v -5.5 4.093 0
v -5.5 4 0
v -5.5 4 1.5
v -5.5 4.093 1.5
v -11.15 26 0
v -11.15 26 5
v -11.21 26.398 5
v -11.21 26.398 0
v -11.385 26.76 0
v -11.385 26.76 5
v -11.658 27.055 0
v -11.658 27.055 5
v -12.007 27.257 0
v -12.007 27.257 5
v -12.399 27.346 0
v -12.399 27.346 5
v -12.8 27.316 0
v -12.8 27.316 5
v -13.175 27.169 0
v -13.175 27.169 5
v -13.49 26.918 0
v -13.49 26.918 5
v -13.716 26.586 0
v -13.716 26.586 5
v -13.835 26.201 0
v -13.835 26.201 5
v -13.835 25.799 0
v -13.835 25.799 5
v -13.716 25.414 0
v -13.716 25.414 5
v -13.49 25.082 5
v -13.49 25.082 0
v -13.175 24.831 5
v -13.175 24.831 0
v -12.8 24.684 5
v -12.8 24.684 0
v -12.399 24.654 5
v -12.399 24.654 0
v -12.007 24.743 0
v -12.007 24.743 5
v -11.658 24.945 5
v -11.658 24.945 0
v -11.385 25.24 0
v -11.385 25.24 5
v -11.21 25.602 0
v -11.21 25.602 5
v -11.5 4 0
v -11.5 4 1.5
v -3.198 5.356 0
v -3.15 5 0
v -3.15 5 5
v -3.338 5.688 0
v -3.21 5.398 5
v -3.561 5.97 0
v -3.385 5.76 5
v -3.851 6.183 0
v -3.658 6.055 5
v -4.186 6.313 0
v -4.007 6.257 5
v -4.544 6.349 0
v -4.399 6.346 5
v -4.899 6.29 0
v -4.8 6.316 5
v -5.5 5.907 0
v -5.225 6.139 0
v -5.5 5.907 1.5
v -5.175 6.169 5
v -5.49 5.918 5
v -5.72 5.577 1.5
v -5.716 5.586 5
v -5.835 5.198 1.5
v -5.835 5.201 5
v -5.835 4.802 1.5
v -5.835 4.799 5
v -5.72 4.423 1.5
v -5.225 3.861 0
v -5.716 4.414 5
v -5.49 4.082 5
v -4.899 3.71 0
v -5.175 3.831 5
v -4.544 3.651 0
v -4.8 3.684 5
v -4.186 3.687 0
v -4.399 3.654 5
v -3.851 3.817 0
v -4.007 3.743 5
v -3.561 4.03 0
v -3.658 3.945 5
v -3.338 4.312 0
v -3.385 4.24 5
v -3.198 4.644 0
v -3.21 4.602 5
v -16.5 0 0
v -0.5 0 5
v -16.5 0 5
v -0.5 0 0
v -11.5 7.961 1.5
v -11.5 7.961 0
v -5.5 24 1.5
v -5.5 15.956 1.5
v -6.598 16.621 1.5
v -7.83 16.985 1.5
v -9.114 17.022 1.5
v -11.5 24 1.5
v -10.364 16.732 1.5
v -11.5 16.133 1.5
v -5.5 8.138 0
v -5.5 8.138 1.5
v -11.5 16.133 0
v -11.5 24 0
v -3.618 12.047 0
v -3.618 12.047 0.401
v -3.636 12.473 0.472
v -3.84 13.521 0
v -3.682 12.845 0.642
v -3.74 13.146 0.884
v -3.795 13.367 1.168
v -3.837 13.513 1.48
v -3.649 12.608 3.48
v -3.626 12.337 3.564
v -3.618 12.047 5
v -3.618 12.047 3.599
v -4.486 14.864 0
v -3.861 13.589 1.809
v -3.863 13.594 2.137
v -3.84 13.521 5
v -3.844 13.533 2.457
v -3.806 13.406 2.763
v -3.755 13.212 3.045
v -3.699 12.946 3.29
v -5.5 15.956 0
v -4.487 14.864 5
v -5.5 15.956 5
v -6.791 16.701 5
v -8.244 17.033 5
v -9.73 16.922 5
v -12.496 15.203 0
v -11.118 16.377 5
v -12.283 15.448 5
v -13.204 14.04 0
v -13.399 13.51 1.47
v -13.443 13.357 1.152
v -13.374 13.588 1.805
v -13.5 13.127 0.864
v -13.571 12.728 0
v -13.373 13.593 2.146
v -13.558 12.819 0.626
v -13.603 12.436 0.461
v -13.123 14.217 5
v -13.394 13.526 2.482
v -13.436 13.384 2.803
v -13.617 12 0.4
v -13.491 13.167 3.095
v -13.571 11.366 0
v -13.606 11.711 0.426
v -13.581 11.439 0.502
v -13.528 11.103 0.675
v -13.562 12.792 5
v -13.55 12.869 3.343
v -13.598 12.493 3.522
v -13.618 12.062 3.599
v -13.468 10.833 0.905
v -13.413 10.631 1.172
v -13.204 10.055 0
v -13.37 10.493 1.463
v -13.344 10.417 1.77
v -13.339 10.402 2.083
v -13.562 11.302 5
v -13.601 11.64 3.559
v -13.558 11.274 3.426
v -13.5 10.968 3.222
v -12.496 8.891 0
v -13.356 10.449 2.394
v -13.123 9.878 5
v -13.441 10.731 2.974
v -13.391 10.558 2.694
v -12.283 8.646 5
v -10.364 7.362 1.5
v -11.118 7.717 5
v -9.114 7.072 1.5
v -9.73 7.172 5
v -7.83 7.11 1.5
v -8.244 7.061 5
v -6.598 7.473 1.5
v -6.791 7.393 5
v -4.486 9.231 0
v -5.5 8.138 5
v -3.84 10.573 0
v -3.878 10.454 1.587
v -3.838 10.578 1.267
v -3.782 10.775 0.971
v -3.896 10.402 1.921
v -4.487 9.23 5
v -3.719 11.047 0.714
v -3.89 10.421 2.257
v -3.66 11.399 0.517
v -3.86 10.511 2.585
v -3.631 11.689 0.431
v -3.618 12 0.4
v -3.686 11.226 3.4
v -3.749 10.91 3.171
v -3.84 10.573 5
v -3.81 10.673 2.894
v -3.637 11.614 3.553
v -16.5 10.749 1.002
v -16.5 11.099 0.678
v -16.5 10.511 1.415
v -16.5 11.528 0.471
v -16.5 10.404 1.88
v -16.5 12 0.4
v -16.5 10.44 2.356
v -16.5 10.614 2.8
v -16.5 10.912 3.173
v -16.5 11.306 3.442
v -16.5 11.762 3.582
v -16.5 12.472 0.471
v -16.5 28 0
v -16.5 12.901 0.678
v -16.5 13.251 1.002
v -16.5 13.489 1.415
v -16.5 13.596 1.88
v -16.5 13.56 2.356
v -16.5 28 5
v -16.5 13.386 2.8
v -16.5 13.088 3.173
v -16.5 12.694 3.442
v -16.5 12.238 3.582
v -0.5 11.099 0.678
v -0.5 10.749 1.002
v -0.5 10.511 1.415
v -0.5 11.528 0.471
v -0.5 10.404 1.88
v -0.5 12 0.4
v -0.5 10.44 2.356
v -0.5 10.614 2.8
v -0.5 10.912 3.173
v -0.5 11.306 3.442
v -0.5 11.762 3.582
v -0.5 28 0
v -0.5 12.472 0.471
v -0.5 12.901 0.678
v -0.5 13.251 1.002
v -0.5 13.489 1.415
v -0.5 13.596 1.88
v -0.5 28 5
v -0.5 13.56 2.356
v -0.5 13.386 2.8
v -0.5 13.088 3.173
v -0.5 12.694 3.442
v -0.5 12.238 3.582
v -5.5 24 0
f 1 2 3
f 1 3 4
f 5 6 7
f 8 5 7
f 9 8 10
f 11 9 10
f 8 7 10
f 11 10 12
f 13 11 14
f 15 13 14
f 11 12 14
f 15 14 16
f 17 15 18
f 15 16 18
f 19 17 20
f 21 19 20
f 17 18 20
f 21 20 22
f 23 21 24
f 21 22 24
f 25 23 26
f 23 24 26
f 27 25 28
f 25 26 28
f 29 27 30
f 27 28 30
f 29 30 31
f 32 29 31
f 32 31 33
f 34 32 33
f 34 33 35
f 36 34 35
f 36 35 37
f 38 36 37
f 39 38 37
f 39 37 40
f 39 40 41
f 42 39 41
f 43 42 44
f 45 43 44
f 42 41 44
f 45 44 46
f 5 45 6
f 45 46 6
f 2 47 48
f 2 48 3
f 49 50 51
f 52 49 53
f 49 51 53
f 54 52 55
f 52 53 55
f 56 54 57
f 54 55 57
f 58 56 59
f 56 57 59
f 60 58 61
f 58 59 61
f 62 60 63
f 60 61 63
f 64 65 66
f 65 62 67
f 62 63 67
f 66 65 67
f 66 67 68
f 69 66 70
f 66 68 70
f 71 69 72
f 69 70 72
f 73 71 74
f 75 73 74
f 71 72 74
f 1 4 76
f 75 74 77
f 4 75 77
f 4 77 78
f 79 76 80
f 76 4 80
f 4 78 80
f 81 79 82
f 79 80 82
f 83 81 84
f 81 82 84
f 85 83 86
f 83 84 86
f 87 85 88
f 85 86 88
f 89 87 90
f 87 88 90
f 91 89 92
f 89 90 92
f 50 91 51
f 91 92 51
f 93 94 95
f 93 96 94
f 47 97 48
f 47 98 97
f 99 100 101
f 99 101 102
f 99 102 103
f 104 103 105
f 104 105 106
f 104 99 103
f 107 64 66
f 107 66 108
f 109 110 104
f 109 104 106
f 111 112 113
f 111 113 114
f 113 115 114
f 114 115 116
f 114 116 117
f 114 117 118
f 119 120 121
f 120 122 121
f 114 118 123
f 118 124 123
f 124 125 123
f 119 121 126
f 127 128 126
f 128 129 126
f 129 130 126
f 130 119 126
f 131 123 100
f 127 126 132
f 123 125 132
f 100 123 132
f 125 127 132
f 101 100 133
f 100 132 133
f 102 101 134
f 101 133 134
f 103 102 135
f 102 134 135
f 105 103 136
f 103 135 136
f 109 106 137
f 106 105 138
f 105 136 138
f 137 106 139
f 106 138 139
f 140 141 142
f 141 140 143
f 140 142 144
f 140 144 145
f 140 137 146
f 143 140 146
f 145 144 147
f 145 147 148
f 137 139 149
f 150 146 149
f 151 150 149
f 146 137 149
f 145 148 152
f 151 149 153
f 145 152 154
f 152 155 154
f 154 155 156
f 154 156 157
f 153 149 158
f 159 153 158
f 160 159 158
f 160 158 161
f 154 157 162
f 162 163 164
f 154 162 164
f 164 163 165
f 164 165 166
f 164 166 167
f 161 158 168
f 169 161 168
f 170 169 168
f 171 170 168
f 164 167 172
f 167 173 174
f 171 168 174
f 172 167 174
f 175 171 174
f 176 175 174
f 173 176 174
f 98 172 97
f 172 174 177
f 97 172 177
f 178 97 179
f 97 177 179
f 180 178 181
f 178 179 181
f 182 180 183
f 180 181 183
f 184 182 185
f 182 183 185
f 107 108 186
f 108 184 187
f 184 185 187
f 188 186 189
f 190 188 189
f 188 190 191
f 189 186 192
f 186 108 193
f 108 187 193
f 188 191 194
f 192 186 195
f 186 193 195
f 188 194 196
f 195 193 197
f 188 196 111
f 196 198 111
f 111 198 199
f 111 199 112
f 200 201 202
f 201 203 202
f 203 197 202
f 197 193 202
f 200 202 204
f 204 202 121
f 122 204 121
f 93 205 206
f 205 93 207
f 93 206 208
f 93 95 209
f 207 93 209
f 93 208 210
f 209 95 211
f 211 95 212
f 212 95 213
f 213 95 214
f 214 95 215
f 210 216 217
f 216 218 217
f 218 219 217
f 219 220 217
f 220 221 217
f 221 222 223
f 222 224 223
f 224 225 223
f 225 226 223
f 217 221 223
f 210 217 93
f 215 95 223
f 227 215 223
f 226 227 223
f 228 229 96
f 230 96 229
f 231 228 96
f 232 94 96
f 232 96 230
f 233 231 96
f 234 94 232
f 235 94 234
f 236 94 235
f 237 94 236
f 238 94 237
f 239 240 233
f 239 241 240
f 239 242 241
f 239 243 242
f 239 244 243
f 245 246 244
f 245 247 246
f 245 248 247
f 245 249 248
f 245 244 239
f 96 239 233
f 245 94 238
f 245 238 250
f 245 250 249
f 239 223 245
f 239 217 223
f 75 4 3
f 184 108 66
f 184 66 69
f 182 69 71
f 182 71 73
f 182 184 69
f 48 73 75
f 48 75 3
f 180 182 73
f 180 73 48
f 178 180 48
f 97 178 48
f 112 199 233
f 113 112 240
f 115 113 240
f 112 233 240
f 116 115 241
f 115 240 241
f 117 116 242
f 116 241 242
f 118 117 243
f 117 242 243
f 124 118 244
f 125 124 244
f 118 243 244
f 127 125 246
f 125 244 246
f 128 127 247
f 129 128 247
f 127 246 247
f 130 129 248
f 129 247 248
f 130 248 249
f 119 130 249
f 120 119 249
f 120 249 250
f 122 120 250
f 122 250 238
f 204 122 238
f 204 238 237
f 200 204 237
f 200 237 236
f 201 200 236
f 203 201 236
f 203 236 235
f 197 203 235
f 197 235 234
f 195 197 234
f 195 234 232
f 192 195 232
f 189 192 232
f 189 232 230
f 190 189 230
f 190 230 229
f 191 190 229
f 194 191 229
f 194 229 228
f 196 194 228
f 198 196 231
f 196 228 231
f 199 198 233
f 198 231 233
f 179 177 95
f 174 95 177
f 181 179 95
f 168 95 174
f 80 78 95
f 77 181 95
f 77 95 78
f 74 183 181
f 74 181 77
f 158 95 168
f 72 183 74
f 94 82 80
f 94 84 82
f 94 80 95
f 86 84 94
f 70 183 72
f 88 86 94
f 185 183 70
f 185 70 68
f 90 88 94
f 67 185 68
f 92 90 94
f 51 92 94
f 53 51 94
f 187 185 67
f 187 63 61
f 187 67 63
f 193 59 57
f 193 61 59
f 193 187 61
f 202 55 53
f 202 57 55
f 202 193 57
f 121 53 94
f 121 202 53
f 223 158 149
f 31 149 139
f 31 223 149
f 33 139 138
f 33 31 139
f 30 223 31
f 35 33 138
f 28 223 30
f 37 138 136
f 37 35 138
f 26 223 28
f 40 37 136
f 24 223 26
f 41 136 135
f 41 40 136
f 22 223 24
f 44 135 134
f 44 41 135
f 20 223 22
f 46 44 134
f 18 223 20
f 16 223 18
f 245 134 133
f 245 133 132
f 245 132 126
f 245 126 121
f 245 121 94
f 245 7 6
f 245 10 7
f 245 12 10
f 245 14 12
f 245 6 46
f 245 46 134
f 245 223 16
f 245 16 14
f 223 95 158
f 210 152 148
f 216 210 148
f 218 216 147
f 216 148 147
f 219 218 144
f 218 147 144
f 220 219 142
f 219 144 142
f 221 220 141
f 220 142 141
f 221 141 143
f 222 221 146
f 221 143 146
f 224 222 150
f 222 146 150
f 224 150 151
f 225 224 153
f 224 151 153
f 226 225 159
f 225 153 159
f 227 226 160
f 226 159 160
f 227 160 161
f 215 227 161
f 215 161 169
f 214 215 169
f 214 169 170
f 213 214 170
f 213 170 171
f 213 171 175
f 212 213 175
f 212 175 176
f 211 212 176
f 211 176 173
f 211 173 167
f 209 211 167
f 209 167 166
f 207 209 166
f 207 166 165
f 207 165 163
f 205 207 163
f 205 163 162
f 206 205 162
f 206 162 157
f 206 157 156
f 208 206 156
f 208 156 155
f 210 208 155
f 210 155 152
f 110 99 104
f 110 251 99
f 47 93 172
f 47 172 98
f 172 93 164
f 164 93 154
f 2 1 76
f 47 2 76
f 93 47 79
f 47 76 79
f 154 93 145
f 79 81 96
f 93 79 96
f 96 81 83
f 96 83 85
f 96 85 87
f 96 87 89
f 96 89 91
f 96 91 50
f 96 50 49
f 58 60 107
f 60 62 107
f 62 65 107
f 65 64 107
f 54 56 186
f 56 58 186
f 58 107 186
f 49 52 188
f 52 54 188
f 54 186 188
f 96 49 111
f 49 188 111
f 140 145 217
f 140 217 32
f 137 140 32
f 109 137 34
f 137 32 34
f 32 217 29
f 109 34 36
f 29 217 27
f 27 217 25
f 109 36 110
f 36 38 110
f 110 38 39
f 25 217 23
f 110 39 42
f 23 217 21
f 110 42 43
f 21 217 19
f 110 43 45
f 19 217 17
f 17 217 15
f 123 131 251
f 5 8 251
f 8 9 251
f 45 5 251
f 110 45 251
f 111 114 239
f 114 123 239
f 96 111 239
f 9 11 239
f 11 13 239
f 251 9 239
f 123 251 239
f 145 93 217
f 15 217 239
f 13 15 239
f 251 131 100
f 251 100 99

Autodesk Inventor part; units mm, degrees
ref_plane "YZ Plane" through (0, 0, 0) normal (1, 0, 0) x (0, 1, 0)
ref_plane "XZ Plane" through (0, 0, 0) normal (0, 1, 0) x (-1, 0, 0)
ref_plane "XY Plane" through (0, 0, 0) normal (0, 0, 1) x (1, 0, 0)
sketch "Sketch2" plane through (0, 0, 0) normal (0, 0, 1) x (1, 0, 0)
  line L0 (-17, 28) -> (0, 28)
  line L1 (0, 28) -> (0, 17)
  line L2 (0, 7) -> (0, 0)
  line L3 (0, 0) -> (-17, 0)
  line L4 (-17, 0) -> (-17, 7)
  line L5 (-17, 28) -> (-17, 17)
  line L6 (-17, 17) -> (-17, 7)
  line L7 (0, 17) -> (0, 7)
  dimension "d0" = 17
  dimension "d1" = 28
extrude "Extrusion1" add sketch "Sketch2" along normal blind 5
sketch "Sketch4" plane through (0, 0, 0) normal (0, 0, -1) x (-1, 0, 0)
  line L0 (17, 28) -> (0, 28) projected
  line L1 (0, 28) -> (0, 0) projected
  line L2 (0, 0) -> (17, 0) projected
  line L3 (17, 0) -> (17, 28) projected
  line L4 (0, 28) -> (17, 28) projected
  line L5 (11.5, 24) -> (11.5, 4)
  line L6 (11.5, 4) -> (5.5, 4)
  line L7 (5.5, 4) -> (5.5, 24)
  line L8 (5.5, 24) -> (11.5, 24)
  dimension "d15" = 6
  dimension "d17" = 5.5
  dimension "d30" = 20
  dimension "d31" = 4
extrude "Extrusion3" cut sketch "Sketch4" against normal blind 1.5 contours L5 L6 L7 L8
sketch "Sketch5" plane through (0, 0, 5) normal (0, 0, 1) x (1, 0, 0)
  line L0 (0, 28) -> (-17, 28) projected
  line L1 (-17, 28) -> (-17, 0) projected
  line L2 (-17, 0) -> (0, 0) projected
  line L3 (0, 0) -> (0, 28) projected
  line L4 (-21, 17) -> (4, 7)
  line L5 (-21.4753, 7) -> (4, 17)
  circle A0 centre (-8.6177, 12.0471) radius 5
  dimension "d20" = 10
  dimension "d21" = 12.0471
extrude "Extrusion4" cut sketch "Sketch5" against normal through all contours A0 L4 L5 | L5 L4 A0 | L4 L5 A0 | A0 L5 L4
sketch "Sketch6" plane through (0, 0, 5) normal (0, 0, 1) x (1, 0, 0)
  circle A0 centre (-8.6177, 12.0471) radius 5 projected
  line L0 (0, 28) -> (-17, 28) projected
  line L1 (-17, 28) -> (-17, 0) projected
  line L2 (-17, 0) -> (0, 0) projected
  line L3 (0, 0) -> (0, 28) projected
  circle A1 centre (-12.5, 26) radius 1.35
  dimension "d24" = 2.7
  dimension "d25" = 4.5
  dimension "d26" = 2
extrude "Extrusion5" cut sketch "Sketch6" against normal through all contours A1
sketch "Sketch7" plane through (0, 0, 5) normal (0, 0, 1) x (1, 0, 0)
  line L0 (0, 0) -> (0, 28) projected
  line L1 (-17, 0) -> (0, 0) projected
  circle A0 centre (-4.5, 5) radius 1.35
  point P0 (0, 7)
  dimension "d32" = 2.7
  dimension "d33" = 4.5
  dimension "d34" = 5
extrude "Extrusion6" cut sketch "Sketch7" against normal through all
sketch "Sketch8" plane through (0, 0, 0) normal (1, 0, 0) x (0, 0, -1)
  circle A0 centre (-2, 12) radius 1.6
  line L0 (-5, 0) -> (-5, 28) projected
  line L1 (0, 0) -> (-5, 0) projected
  point P0 (0, -7)
  dimension "d37" = 3.2
  dimension "d41" = 12
  dimension "d49" = 3
extrude "Extrusion8" cut sketch "Sketch8" against normal through all
sketch "Sketch9" plane through (0, 0, 5) normal (0, 0, 1) x (1, 0, 0)
  circle A0 centre (-4.5, 5) radius 1.35 projected
  circle A1 centre (-12.5, 26) radius 1.35 projected
  circle A2 centre (-8.6177, 12.0471) radius 5 projected
  line L0 (0, 28) -> (-17, 28) projected
  line L1 (-17, 28) -> (-17, 0) projected
  line L2 (-17, 0) -> (0, 0) projected
  line L3 (0, 0) -> (0, 28) projected
  line L4 (-17, 0) -> (-16.5, 0)
  line L5 (-16.5, 0) -> (-16.5, 28)
  line L6 (-16.5, 28) -> (-17, 28)
  line L7 (-17, 28) -> (-17, 0)
  line L8 (0, 0) -> (-0.5, 0)
  line L9 (-0.5, 0) -> (-0.5, 28)
  line L10 (-0.5, 28) -> (0, 28)
  line L11 (0, 28) -> (0, 0)
  dimension "d47" = 0.5
  dimension "d48" = 0.5
extrude "Extrusion9" cut sketch "Sketch9" against normal through all contours L3 L2 L9 L0 | L5 L2 L1 L0
properties part number "tapa0.2"
